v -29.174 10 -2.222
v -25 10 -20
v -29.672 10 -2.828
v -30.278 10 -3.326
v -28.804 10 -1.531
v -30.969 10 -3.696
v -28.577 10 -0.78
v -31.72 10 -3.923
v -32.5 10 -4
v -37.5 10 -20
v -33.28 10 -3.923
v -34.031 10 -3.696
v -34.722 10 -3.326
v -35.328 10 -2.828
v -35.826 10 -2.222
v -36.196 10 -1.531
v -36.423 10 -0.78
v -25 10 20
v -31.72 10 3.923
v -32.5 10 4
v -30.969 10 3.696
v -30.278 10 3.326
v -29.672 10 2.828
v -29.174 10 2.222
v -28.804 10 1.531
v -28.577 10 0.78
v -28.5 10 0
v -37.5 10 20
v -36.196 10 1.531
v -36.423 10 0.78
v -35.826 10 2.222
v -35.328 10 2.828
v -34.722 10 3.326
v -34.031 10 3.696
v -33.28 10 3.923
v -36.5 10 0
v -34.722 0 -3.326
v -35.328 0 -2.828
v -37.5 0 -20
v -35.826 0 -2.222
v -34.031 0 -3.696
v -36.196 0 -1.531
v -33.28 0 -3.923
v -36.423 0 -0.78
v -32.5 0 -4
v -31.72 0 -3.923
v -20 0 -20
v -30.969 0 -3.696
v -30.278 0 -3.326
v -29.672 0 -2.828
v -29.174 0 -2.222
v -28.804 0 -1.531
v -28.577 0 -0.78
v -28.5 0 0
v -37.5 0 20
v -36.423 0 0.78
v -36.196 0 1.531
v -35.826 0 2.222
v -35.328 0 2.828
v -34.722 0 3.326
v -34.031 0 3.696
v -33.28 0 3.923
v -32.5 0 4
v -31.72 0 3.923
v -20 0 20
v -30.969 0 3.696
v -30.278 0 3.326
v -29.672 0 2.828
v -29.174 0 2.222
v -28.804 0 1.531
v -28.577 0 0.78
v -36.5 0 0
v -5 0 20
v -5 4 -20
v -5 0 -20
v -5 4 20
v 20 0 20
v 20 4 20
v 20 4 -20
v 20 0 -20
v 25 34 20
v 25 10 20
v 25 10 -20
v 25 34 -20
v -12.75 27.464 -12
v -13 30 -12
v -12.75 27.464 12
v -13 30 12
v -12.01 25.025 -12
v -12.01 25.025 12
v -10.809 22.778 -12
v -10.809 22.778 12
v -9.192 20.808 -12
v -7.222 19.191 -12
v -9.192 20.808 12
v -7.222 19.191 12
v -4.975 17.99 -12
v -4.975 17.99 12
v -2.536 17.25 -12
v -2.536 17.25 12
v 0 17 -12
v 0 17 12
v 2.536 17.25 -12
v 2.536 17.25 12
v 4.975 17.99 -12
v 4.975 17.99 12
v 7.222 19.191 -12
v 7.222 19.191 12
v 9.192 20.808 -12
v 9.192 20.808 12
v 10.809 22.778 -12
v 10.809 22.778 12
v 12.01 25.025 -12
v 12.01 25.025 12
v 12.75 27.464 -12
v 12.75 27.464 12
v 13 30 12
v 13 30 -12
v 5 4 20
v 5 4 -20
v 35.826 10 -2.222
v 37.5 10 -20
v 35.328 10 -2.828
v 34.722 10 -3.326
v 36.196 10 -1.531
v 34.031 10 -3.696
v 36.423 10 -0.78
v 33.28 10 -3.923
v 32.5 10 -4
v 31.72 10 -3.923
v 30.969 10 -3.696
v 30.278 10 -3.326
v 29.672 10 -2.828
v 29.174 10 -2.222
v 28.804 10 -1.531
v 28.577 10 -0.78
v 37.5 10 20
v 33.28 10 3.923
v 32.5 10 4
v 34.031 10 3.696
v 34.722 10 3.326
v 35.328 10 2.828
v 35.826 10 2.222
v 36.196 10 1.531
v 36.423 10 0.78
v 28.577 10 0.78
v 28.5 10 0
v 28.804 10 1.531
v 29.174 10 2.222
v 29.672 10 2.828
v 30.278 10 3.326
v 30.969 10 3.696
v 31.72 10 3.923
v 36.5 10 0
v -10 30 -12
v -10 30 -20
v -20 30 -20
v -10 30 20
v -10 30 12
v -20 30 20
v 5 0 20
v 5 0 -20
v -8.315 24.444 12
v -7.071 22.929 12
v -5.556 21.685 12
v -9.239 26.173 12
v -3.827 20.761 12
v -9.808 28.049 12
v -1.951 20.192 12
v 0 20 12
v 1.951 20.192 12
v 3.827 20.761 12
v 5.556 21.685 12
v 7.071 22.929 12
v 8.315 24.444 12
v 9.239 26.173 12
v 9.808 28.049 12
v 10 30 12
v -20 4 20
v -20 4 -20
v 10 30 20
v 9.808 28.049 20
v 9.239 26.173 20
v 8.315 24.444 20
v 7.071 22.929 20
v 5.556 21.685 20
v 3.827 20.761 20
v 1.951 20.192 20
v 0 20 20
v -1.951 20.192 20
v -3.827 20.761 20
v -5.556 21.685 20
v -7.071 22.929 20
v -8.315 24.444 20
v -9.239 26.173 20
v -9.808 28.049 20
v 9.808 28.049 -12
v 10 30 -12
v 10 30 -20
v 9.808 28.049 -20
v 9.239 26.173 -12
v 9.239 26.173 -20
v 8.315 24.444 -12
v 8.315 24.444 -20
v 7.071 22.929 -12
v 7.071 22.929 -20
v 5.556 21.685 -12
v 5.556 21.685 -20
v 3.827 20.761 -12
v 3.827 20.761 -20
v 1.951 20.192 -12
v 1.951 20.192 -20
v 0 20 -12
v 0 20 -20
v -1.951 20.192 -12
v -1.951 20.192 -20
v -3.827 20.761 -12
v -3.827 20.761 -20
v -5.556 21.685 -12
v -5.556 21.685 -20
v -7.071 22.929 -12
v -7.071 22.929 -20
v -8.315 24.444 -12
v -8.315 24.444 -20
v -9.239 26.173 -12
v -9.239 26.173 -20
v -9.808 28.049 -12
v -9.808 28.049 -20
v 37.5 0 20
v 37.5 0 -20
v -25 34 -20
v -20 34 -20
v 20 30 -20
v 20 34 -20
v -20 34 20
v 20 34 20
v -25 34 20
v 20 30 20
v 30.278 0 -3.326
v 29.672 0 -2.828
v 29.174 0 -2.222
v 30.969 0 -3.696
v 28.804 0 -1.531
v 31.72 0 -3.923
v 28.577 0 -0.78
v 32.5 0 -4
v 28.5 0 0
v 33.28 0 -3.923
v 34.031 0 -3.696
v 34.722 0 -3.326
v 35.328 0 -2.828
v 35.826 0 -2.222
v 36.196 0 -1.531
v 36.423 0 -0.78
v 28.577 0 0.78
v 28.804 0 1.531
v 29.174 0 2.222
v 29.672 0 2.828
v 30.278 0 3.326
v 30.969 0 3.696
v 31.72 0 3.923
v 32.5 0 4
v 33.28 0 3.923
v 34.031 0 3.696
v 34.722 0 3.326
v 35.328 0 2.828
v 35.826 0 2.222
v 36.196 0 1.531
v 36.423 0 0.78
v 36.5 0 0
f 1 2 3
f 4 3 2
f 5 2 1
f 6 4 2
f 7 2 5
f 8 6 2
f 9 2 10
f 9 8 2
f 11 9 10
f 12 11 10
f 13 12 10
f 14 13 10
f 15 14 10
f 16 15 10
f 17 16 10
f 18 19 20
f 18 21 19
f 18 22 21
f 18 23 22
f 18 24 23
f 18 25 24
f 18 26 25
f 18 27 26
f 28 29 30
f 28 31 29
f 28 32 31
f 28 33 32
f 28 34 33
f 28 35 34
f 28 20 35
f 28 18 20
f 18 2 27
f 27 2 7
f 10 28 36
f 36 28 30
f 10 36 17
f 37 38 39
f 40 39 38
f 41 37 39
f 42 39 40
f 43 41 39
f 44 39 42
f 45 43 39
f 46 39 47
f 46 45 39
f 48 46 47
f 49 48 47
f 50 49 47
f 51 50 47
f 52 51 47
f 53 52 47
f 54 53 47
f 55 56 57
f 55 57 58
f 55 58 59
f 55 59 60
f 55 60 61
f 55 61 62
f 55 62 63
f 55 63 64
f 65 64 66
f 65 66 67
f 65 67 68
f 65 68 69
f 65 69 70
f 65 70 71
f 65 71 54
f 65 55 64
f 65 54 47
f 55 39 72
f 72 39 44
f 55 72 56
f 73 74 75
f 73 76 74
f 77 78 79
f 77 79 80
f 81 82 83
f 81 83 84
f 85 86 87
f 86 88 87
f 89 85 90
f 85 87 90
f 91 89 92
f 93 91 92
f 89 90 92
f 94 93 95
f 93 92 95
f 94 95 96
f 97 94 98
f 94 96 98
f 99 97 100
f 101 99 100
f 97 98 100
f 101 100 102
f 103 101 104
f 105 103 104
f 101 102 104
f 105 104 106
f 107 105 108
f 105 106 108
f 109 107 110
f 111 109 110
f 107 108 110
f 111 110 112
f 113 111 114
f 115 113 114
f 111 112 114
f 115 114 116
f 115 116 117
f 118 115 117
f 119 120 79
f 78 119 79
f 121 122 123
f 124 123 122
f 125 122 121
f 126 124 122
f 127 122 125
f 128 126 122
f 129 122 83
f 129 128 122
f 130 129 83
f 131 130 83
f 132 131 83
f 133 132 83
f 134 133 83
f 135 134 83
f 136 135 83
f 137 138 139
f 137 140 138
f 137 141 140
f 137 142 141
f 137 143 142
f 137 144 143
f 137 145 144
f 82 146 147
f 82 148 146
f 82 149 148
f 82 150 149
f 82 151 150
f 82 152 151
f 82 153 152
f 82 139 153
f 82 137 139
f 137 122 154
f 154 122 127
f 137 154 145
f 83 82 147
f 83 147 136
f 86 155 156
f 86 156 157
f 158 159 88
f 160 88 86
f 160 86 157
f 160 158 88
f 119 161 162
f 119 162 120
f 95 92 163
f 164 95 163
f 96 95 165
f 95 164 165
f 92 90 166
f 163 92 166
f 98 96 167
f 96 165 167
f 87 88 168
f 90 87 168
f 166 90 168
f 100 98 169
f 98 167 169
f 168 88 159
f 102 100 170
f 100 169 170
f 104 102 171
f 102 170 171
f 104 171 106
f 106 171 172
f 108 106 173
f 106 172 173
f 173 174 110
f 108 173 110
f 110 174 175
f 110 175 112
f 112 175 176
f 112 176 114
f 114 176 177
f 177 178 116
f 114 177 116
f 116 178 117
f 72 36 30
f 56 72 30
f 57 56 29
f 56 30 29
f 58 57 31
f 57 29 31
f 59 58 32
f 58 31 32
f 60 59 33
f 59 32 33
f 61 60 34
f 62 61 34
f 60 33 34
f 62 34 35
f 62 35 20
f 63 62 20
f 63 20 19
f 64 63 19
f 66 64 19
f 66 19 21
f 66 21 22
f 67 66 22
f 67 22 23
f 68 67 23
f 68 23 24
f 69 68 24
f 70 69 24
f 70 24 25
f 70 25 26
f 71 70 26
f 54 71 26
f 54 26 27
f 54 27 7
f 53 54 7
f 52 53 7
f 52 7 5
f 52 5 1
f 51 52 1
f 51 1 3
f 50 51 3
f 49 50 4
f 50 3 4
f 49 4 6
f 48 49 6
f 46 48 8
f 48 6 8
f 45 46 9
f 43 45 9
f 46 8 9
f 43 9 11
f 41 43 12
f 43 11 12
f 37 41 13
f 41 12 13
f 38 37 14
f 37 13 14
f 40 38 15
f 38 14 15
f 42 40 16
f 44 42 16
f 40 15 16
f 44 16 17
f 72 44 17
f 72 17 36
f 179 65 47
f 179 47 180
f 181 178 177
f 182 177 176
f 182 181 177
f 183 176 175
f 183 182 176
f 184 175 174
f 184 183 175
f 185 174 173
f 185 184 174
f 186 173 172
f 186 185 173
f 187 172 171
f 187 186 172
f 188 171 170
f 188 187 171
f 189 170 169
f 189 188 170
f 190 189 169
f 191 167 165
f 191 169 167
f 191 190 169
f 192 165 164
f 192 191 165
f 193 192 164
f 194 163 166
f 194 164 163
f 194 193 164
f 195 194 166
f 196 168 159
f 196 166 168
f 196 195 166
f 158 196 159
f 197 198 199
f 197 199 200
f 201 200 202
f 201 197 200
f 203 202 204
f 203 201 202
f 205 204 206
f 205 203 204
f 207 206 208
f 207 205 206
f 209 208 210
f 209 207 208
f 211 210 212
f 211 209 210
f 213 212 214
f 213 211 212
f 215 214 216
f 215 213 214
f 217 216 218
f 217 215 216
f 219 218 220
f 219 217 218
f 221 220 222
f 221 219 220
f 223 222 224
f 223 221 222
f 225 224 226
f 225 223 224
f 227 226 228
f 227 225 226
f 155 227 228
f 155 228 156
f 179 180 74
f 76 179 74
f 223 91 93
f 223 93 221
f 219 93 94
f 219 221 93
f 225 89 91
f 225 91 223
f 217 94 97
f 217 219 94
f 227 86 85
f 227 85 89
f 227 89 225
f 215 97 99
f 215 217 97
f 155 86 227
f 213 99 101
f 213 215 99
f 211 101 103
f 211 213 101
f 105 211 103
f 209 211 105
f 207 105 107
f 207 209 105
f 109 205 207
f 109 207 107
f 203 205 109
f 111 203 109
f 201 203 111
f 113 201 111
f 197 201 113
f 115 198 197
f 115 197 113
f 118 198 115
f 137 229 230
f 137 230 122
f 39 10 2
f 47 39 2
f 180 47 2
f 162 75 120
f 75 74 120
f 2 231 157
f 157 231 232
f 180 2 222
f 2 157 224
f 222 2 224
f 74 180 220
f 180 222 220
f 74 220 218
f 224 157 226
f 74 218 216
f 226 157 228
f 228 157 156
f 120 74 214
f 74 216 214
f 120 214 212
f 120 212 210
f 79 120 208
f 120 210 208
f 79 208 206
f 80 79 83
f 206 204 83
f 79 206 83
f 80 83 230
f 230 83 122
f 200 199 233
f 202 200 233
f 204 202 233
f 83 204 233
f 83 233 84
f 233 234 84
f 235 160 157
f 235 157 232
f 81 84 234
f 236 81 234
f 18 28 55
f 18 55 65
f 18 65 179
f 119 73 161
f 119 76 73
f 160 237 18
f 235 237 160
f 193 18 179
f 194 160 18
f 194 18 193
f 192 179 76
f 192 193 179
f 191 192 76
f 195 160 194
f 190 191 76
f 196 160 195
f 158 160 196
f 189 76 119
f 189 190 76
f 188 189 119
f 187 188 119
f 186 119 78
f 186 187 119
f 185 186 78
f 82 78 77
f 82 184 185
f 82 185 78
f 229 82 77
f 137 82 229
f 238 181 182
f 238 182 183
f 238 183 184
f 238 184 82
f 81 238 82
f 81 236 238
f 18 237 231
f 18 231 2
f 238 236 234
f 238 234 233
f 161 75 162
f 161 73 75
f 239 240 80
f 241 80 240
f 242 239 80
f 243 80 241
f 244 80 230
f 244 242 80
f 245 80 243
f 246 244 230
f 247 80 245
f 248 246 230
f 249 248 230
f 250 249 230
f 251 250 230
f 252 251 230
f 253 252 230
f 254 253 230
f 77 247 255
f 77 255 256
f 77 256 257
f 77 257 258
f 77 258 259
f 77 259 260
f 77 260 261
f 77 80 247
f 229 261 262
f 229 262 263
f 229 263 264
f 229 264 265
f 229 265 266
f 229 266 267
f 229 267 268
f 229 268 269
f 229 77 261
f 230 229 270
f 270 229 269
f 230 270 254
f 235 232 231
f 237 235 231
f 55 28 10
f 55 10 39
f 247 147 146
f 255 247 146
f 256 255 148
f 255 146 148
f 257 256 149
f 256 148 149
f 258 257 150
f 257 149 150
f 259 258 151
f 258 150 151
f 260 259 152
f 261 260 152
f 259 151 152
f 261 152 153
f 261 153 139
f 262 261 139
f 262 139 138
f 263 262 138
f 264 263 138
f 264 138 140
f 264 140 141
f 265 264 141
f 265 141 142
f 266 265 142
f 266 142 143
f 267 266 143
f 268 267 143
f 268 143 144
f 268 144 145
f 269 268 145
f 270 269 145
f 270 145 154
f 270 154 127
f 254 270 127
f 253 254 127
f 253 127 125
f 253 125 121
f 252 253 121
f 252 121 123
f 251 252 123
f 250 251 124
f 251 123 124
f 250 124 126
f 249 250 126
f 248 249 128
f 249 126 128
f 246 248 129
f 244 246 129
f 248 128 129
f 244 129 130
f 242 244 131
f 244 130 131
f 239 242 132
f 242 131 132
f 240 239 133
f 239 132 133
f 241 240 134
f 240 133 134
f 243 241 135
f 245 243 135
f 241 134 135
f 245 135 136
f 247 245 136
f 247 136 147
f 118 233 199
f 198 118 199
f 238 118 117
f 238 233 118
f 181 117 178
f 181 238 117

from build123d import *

# Parameters (mm, degrees)
EXTRUDE_1_DEPTH     = 20
SKETCH_2_R          = 13
CUT_EXTRUDE_1_DEPTH = 12
SKETCH_3_R          = 4
CUT_EXTRUDE_2_DEPTH = 49.808298475


with BuildPart() as part:
    # 草图1 → 凸台-拉伸1 (new, symmetric)
    with BuildSketch(Plane.XY):
        with BuildLine():
            Line((-5, 0), (5, 0))
            Line((5, 0), (5, 4))
            Line((5, 4), (20, 4))
            Line((20, 4), (20, 0))
            Line((20, 0), (37.5, 0))
            Line((37.5, 0), (37.5, 10))
            Line((37.5, 10), (25, 10))
            Line((25, 10), (25, 34))
            Line((25, 34), (20, 34))
            Line((20, 34), (20, 30))
            Line((20, 30), (10, 30))
            ThreePointArc((10, 30), (0, 20), (-10, 30))
            Line((-10, 30), (-20, 30))
            Line((-20, 30), (-20, 34))
            Line((-20, 34), (-25, 34))
            Line((-25, 34), (-25, 10))
            Line((-25, 10), (-37.5, 10))
            Line((-37.5, 10), (-37.5, 0))
            Line((-37.5, 0), (-20, 0))
            Line((-20, 0), (-20, 4))
            Line((-20, 4), (-5, 4))
            Line((-5, 4), (-5, 0))
        make_face()
    extrude(amount=EXTRUDE_1_DEPTH, both=True)

    # 草图2 → 切除-拉伸1 (cut, symmetric)
    with BuildSketch(Plane.XY):
        with Locations((0, 30)):
            Circle(SKETCH_2_R)
    extrude(amount=CUT_EXTRUDE_1_DEPTH, both=True, mode=Mode.SUBTRACT)

    # 草图3 → 切除-拉伸2 (cut, through all)
    with BuildSketch(Plane(origin=(0, 10, 0), x_dir=(1, 0, 0), z_dir=(0, 1, 0))):
        with Locations(Location((-32.5, 0, 0), (0, 0, 180))):
            Circle(SKETCH_3_R)
        with Locations(Location((32.5, 0, 0), (0, 0, 180))):
            Circle(SKETCH_3_R)
    extrude(amount=-CUT_EXTRUDE_2_DEPTH, mode=Mode.SUBTRACT)


solid = part.part
